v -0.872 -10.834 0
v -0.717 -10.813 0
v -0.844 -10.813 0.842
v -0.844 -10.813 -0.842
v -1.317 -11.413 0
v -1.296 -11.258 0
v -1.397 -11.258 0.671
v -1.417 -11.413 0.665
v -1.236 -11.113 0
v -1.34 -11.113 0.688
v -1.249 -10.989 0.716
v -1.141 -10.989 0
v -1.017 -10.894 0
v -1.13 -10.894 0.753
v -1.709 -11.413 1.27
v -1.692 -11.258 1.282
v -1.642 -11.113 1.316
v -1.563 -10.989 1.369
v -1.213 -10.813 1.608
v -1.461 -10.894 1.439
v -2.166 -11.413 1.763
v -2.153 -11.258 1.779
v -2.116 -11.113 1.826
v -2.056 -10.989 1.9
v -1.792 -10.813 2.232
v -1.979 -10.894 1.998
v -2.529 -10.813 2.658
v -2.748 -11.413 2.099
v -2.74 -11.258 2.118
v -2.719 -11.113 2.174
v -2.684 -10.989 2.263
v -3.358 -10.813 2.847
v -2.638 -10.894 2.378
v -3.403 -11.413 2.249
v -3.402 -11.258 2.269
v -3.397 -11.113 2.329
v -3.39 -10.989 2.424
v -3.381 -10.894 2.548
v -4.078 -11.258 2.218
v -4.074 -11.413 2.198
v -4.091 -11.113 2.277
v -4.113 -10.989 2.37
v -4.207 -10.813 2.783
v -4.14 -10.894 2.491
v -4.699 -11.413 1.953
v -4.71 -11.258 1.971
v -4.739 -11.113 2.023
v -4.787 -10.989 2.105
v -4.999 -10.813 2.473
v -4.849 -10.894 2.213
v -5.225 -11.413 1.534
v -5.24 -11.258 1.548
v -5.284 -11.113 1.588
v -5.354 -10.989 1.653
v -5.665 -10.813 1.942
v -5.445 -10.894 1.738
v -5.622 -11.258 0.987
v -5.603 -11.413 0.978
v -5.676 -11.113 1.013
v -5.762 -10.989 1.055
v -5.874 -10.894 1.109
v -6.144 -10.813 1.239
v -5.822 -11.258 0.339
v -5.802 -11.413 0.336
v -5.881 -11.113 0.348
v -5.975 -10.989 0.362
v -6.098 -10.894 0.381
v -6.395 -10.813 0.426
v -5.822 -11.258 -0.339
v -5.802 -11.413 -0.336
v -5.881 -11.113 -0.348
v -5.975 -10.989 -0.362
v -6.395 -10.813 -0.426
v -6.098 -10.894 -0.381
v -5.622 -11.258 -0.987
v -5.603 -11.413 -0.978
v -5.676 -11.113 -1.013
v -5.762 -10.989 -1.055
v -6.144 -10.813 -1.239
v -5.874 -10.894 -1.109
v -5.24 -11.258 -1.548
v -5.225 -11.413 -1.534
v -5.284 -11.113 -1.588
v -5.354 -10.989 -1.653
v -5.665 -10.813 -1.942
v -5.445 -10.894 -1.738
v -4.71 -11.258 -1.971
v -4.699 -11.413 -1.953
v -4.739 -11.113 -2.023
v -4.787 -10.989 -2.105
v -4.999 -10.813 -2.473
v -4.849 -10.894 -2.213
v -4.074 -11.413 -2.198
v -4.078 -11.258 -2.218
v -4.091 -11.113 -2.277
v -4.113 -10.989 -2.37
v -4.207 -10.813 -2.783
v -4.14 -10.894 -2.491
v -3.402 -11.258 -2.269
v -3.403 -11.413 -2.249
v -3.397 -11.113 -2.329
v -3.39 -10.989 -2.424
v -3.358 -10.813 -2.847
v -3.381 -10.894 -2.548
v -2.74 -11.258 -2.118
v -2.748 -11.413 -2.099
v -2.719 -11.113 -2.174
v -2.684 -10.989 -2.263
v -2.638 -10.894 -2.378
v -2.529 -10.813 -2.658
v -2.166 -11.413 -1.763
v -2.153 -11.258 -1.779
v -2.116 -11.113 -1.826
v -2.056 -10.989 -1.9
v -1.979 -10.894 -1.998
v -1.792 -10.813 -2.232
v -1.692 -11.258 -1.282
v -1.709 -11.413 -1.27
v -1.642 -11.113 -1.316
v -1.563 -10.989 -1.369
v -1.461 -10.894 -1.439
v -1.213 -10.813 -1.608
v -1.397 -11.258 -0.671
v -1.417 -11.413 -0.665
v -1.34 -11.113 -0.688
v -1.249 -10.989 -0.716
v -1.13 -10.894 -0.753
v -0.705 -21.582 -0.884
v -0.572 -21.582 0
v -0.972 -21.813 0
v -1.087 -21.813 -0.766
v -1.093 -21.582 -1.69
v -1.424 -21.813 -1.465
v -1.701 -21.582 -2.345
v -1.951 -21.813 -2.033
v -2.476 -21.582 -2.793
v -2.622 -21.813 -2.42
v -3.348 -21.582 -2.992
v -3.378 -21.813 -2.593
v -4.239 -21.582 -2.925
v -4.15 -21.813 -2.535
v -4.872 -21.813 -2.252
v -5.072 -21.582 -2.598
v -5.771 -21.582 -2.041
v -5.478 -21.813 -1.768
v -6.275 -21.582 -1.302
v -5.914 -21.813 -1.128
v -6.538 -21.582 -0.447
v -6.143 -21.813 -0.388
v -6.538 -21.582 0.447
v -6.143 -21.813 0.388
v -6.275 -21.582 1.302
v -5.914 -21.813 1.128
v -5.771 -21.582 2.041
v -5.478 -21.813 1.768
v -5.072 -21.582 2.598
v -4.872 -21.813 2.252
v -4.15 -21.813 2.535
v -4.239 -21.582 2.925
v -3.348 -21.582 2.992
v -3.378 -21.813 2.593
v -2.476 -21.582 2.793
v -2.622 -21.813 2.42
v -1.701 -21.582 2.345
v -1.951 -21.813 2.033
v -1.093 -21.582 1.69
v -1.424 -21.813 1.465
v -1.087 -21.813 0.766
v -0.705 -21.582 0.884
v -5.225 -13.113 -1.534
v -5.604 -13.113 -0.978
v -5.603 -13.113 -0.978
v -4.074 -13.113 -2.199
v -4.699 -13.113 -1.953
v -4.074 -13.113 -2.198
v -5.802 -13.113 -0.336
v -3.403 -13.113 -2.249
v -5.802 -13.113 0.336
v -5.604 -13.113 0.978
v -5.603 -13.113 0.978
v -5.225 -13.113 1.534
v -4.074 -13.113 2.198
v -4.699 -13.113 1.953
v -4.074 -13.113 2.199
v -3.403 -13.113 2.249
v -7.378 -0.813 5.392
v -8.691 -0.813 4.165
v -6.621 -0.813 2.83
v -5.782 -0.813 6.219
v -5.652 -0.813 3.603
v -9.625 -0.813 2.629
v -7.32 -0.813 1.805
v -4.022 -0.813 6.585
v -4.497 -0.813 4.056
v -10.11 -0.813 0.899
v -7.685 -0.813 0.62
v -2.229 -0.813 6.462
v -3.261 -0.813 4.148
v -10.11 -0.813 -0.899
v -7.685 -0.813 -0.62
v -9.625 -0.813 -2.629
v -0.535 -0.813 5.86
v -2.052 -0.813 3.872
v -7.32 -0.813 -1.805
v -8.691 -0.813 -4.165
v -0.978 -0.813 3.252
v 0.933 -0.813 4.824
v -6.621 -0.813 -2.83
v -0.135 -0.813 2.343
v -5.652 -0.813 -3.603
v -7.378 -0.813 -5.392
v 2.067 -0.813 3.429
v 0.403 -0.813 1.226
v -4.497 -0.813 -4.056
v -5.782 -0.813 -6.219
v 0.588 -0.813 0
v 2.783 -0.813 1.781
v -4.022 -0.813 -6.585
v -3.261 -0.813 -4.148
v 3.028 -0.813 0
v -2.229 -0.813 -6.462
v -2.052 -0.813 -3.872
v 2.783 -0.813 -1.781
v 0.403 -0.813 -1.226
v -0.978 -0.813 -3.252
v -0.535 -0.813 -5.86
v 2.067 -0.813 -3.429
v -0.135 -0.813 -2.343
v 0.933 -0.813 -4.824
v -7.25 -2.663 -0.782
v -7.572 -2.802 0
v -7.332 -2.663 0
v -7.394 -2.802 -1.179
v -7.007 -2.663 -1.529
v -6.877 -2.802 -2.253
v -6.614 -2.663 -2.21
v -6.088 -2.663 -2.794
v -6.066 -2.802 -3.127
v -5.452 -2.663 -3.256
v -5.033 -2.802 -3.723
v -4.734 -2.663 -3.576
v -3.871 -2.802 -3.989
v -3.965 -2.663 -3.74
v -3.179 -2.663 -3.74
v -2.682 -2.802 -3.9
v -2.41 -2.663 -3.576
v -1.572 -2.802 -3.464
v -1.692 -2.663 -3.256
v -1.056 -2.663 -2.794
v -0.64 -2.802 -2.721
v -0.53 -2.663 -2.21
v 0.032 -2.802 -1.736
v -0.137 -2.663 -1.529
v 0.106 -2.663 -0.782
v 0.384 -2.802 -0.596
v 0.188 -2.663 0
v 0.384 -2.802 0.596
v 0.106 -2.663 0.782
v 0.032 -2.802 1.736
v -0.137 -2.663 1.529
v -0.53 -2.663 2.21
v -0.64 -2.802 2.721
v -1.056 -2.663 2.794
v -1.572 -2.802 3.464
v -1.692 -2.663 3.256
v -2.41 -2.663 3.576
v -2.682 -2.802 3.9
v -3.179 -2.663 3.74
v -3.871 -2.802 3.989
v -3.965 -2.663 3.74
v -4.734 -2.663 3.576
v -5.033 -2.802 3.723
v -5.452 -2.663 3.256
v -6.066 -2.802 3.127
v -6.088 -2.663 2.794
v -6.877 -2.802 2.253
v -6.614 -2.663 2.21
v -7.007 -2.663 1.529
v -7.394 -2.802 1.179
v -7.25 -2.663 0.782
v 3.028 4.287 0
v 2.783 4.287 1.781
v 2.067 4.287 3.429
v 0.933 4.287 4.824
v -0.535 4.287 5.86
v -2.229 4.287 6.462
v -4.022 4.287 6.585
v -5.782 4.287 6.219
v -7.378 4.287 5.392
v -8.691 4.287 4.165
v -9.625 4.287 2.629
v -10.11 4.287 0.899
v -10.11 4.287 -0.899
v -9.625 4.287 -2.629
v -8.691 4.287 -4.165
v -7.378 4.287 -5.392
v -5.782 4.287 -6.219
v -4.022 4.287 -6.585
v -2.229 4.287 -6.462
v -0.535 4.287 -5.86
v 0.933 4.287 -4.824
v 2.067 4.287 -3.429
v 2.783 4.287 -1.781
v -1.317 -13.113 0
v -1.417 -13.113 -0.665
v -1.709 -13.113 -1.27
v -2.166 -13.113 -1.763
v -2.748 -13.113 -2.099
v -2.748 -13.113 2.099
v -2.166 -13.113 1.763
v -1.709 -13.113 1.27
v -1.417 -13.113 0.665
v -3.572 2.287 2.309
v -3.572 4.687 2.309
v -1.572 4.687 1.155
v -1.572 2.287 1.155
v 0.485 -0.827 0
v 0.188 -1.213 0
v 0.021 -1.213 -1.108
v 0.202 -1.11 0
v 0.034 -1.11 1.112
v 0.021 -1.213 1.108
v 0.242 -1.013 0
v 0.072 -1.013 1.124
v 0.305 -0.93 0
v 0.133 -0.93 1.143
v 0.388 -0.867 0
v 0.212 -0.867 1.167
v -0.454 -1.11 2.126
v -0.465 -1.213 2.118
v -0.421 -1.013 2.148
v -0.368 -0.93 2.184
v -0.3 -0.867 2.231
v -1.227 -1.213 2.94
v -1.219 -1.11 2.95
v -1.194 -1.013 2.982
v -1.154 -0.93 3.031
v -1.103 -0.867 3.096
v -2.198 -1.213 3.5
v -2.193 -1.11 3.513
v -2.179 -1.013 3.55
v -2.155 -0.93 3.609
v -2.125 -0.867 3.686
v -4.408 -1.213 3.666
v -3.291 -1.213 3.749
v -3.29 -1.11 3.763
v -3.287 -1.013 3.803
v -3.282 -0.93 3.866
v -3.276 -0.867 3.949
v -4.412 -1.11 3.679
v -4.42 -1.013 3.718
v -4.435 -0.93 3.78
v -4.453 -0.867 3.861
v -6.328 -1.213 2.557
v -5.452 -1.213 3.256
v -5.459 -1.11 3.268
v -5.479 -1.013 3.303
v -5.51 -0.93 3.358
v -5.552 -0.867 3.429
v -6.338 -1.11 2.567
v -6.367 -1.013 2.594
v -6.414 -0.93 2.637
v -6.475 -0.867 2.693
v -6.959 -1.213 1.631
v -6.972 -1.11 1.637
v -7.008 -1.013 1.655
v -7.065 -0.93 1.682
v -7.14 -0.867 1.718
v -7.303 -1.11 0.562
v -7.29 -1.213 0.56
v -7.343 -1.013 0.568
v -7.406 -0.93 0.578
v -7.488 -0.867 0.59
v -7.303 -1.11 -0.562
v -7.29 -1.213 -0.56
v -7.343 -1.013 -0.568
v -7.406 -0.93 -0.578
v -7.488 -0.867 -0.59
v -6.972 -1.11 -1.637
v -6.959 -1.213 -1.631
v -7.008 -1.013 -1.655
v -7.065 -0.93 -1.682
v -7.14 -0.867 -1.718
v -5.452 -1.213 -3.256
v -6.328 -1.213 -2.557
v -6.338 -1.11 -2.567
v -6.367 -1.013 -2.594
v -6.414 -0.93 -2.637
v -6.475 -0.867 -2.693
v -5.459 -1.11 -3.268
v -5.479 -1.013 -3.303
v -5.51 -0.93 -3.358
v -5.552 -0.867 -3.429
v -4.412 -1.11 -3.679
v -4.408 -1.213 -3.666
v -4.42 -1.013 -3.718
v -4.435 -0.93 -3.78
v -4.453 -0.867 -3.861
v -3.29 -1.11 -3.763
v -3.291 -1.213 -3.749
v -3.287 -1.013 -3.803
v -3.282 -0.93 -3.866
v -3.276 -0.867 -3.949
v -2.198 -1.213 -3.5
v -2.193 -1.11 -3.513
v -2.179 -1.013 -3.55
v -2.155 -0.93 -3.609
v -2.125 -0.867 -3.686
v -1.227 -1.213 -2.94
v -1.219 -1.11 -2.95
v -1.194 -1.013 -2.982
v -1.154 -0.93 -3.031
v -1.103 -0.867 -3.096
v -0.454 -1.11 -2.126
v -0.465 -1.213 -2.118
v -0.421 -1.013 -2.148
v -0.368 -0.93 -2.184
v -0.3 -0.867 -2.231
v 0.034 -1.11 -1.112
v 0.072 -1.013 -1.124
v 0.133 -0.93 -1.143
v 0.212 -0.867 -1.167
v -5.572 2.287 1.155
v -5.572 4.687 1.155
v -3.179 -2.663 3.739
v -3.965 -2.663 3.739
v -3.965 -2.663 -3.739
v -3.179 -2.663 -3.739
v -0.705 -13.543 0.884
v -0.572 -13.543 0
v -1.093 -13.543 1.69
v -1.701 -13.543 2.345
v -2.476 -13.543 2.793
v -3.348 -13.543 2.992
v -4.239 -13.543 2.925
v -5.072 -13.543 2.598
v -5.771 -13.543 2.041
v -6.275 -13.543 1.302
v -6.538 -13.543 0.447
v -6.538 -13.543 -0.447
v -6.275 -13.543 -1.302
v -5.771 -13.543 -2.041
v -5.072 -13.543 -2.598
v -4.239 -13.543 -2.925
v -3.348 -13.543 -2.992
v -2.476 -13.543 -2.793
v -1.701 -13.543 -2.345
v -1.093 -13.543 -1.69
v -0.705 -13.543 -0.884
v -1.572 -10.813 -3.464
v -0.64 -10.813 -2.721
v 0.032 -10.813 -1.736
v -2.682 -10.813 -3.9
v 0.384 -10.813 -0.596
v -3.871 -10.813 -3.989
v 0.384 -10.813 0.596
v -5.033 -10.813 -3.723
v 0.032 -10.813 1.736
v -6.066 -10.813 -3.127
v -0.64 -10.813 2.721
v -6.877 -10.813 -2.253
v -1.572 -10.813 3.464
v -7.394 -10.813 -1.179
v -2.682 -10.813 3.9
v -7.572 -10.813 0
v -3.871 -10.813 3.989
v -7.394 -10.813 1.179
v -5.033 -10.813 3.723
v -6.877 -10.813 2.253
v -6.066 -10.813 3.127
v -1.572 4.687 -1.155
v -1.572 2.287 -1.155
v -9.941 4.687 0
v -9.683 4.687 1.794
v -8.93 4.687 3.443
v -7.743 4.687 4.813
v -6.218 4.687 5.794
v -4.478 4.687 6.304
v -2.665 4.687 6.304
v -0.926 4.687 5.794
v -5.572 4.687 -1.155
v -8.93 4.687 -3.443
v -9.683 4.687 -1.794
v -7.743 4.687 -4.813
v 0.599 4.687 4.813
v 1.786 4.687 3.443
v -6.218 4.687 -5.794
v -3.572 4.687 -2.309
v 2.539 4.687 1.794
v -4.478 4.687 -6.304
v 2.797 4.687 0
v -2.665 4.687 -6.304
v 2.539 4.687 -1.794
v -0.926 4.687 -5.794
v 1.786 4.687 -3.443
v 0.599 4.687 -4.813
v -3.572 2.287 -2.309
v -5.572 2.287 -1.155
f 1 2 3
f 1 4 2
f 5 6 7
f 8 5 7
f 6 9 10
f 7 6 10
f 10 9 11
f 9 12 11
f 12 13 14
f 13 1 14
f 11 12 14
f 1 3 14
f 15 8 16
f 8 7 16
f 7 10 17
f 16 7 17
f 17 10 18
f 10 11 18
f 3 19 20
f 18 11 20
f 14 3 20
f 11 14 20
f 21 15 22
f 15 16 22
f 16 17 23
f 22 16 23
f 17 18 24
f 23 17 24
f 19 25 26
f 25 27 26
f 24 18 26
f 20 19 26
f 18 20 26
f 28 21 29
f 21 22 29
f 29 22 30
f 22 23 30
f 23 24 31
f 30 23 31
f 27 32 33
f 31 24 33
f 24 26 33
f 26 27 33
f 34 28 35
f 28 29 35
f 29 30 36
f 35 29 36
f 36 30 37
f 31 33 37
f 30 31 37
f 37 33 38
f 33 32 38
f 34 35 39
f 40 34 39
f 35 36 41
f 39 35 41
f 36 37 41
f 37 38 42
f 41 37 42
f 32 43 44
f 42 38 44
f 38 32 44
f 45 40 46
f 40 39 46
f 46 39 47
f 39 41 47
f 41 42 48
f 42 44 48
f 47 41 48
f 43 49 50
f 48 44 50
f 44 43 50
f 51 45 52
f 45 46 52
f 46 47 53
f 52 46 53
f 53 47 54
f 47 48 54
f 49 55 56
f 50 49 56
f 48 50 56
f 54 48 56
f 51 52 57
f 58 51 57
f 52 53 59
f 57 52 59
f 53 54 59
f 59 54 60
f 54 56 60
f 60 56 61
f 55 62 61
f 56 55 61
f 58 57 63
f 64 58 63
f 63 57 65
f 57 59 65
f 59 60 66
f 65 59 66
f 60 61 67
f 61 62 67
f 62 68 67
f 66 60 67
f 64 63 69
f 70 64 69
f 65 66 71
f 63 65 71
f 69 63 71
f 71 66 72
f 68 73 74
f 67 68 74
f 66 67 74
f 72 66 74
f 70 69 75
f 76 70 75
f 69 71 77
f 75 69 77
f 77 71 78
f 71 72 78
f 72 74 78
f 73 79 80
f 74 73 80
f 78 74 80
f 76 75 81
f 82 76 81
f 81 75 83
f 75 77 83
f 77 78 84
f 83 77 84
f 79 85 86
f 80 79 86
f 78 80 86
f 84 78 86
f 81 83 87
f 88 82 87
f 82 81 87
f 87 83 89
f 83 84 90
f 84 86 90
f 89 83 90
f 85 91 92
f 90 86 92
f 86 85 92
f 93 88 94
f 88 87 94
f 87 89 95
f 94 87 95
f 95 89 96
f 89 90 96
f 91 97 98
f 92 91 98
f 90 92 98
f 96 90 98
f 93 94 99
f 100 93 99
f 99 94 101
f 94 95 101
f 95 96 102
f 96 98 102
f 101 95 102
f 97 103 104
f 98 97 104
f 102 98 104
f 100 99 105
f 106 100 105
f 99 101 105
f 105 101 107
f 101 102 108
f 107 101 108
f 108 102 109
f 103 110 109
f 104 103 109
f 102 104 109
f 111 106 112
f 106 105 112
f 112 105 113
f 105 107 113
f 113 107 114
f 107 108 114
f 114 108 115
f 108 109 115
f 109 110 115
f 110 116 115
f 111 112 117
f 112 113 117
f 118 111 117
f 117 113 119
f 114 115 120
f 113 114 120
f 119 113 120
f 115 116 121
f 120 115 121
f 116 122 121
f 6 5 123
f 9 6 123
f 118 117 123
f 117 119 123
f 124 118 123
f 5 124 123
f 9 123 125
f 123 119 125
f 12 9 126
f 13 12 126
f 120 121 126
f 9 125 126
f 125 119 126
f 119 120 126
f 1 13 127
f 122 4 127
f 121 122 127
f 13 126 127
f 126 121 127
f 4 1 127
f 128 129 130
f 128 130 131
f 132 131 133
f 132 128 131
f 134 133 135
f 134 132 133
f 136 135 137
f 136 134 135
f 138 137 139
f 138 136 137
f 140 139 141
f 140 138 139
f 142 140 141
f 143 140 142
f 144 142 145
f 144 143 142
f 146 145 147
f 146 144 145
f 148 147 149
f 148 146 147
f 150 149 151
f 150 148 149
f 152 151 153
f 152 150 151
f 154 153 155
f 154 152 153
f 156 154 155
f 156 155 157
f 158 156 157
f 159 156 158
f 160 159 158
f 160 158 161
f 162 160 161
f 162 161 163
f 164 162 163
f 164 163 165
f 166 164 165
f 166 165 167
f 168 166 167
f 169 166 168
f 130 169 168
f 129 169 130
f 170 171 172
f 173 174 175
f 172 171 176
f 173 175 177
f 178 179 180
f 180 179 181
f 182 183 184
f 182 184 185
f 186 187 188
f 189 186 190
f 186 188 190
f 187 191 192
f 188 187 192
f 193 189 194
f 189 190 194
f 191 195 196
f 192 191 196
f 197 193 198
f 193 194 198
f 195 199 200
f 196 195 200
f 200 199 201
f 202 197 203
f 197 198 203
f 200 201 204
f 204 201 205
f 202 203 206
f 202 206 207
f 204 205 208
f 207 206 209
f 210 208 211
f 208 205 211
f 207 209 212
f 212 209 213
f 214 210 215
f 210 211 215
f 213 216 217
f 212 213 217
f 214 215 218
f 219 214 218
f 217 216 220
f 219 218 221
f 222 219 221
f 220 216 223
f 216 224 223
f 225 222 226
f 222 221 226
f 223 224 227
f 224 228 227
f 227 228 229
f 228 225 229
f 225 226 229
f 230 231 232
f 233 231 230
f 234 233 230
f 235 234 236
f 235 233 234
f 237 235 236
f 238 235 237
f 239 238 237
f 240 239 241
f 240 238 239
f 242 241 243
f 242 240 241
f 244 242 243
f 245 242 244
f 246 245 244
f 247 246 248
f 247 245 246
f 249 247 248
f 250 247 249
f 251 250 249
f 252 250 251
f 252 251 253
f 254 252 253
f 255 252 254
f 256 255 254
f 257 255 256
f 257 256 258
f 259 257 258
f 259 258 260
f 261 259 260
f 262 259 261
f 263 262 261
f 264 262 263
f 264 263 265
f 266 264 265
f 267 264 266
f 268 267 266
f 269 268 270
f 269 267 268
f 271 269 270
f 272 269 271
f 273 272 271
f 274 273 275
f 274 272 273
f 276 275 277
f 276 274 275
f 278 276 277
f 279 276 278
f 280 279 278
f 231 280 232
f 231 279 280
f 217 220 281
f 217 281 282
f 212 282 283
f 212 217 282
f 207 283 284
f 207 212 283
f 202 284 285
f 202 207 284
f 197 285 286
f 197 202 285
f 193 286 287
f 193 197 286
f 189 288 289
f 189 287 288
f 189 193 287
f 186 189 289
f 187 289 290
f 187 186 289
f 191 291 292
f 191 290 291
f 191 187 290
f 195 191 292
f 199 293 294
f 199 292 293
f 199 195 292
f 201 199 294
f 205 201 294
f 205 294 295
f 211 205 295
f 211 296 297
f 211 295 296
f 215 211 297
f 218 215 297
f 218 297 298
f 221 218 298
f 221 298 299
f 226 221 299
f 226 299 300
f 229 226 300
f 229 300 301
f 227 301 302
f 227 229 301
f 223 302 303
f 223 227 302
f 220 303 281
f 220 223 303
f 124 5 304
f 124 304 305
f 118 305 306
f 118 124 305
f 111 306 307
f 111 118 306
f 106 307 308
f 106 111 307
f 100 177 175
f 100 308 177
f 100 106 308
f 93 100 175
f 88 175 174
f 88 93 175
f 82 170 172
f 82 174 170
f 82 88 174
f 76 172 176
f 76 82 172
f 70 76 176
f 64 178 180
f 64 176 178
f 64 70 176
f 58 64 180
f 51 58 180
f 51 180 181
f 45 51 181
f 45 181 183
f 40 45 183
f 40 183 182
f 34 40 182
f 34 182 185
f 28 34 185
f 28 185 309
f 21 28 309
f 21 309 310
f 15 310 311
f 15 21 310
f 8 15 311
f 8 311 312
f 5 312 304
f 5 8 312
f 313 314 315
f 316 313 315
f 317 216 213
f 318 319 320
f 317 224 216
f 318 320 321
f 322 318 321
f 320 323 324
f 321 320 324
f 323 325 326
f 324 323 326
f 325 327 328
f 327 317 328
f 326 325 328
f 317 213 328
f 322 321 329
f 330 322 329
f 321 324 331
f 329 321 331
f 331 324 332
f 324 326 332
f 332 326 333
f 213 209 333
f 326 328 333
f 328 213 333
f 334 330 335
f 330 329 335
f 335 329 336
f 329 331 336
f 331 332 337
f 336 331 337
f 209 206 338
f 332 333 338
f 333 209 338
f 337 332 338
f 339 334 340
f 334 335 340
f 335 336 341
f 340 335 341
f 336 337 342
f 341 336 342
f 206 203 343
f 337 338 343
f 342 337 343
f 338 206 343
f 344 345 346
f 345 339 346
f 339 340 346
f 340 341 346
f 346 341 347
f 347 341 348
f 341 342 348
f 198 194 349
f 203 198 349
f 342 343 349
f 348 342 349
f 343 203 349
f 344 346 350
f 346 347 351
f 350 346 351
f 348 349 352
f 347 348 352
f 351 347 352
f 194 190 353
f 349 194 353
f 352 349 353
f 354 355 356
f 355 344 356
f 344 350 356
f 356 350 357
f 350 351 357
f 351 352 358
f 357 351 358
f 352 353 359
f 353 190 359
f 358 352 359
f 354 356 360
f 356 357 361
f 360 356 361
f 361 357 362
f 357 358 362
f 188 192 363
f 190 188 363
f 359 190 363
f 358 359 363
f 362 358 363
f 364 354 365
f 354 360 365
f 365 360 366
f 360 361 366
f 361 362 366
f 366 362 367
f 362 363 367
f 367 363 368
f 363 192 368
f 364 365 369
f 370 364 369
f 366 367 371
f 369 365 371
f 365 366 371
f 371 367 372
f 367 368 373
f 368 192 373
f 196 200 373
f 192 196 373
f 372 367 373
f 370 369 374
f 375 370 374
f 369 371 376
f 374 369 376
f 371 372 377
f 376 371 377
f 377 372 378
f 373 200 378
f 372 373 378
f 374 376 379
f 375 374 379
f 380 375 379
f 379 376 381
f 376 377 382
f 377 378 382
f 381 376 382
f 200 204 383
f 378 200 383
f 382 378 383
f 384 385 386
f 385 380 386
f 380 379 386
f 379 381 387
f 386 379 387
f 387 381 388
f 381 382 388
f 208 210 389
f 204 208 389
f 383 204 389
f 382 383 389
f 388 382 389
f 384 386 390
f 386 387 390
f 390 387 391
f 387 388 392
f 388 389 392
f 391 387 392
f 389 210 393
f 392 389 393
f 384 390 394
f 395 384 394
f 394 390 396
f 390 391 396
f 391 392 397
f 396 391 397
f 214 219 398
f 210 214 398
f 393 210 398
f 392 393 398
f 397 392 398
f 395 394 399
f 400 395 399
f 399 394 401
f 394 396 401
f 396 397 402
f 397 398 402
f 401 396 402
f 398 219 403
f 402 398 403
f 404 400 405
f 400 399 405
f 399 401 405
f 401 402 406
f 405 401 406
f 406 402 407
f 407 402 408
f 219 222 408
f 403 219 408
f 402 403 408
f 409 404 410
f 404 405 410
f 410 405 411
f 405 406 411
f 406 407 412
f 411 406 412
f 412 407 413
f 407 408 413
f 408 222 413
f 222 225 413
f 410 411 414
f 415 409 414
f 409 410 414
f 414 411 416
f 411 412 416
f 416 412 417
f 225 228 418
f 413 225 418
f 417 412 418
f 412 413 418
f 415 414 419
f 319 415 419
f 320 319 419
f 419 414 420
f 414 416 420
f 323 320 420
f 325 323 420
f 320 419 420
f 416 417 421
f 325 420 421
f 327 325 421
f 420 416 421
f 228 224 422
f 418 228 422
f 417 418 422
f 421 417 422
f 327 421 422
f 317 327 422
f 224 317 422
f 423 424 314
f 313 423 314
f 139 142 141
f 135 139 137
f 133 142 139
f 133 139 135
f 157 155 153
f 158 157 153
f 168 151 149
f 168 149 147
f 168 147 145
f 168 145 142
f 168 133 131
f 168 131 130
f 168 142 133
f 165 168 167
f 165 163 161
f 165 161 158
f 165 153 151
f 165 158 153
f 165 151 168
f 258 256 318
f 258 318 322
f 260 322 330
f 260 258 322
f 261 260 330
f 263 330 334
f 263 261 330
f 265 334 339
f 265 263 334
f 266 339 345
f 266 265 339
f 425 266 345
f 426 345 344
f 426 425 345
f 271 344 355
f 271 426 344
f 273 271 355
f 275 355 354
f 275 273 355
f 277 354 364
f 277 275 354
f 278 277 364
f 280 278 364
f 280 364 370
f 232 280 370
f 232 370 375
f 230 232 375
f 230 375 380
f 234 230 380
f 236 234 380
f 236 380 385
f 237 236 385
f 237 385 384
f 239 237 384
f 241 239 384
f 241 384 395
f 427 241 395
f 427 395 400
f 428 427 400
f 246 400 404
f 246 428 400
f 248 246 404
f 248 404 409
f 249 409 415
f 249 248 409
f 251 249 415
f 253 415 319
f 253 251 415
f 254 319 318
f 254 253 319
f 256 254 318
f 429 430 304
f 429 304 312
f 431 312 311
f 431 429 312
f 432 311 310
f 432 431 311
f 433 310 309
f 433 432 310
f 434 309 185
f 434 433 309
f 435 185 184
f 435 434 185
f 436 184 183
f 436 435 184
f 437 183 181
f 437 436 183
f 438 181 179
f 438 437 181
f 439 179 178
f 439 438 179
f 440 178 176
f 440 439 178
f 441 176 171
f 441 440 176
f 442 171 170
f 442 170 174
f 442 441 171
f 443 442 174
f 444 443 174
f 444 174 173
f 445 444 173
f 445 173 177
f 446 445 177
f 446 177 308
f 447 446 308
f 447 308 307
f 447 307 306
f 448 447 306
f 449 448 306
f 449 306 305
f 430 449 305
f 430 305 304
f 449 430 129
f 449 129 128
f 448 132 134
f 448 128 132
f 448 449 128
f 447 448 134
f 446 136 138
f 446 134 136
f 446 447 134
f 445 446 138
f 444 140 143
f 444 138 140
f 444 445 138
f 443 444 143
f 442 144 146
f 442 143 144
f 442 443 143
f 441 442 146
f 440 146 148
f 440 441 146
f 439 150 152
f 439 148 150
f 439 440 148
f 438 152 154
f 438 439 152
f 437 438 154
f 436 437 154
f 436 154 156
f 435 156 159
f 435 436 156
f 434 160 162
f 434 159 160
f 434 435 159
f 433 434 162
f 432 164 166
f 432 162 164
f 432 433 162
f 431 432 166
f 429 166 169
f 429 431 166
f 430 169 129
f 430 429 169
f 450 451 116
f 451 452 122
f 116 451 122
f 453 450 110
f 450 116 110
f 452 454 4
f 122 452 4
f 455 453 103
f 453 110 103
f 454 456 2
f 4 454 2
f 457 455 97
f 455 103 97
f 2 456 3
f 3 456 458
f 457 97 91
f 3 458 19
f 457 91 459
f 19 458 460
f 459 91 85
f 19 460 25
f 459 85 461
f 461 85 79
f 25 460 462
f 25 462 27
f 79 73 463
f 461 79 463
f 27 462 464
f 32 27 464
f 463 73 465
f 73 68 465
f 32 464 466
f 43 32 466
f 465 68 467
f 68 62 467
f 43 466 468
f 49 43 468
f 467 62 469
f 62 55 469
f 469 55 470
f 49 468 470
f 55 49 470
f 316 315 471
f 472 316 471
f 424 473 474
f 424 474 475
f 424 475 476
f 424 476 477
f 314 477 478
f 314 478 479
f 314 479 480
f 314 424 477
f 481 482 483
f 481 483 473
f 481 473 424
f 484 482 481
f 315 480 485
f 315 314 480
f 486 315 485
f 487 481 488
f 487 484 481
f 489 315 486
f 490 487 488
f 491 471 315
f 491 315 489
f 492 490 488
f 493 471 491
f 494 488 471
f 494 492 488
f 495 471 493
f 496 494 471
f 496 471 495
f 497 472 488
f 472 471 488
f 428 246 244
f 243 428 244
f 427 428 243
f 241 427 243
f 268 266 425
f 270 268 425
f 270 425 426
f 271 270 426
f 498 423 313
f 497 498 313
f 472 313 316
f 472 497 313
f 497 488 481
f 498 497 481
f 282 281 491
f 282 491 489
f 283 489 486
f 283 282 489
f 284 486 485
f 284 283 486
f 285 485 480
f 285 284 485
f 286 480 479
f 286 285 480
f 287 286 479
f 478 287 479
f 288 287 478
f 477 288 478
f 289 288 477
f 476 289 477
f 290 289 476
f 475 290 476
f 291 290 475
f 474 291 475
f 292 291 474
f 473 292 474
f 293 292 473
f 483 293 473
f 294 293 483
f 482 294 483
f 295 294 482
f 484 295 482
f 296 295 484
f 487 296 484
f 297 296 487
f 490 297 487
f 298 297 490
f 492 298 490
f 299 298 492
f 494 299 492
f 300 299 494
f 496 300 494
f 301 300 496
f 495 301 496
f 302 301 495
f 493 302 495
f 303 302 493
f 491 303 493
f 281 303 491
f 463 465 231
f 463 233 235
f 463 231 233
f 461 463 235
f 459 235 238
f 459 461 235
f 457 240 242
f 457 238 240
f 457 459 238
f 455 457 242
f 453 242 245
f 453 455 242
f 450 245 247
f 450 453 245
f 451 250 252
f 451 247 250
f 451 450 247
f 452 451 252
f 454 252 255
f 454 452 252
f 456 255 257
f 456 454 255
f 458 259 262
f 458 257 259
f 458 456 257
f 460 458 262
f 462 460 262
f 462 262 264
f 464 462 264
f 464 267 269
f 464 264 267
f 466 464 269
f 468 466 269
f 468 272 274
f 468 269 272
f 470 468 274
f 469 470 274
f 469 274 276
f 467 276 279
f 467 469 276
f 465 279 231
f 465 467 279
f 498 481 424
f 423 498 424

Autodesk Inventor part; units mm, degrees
ref_plane "YZ Plane" through (0, 0, 0) normal (1, 0, 0) x (0, 1, 0)
ref_plane "XZ Plane" through (0, 0, 0) normal (0, 1, 0) x (-1, 0, 0)
ref_plane "XY Plane" through (0, 0, 0) normal (0, 0, 1) x (1, 0, 0)
sketch "Sketch1" plane through (0, 0, 0) normal (0, 0, 1) x (1, 0, 0)
  line L0 (-3.5718, -2.6632) -> (-7.5718, -2.6632)
  line L1 (-7.5718, -2.6632) -> (-7.5718, -10.8132)
  line L2 (-7.5718, -10.8132) -> (-3.5718, -10.8132)
  line L3 (-3.5718, -10.8132) -> (-3.5718, -2.6632)
  dimension "d1" = 8.15
  dimension "d2" = 4
revolve "Shoulder" add sketch "Sketch1" angle 360 about axis through (-3.5718, -10.8132, 0) along (0, 1, 0)
sketch "Sketch2" plane through (-3.5718, -2.6632, 0) normal (0, 1, 0) x (1, 0, 0)
  circle A0 centre (0, 0) radius 4 projected
  circle A1 centre (0, 0) radius 3.76
  dimension "d3" = 7.52
extrude "Shoulder_neck" add sketch "Sketch2" along normal blind 1.85 contours A1
sketch "Sketch3" plane through (-3.5718, -0.8132, 0) normal (0, 1, 0) x (1, 0, 0)
  circle A0 centre (0, 0) radius 3.76 projected
  circle A1 centre (0, 0) radius 6.6
  dimension "d6" = 13.2
extrude "Head" add sketch "Sketch3" along normal blind 5.5 contours A0 | A1
sketch "Sketch4" plane through (-3.5718, -10.8132, 0) normal (0, -1, 0) x (1, 0, 0)
  circle A0 centre (0, 0) radius 4 projected
  circle A1 centre (0, 0) radius 2.255
  dimension "d9" = 4.51
extrude "Thread_neck" add sketch "Sketch4" along normal blind 2.3 contours A1
sketch "Sketch5" plane through (-3.5718, -13.1132, 0) normal (0, -1, 0) x (1, 0, 0)
  circle A0 centre (0, 0) radius 2.255 projected
  circle A1 centre (0, 0) radius 3
  dimension "d12" = 6
extrude "Thread_shoulder" add sketch "Sketch5" along normal blind 8.7 contours A0 | A1
sketch "Sketch6" plane through (-3.5718, 4.6868, 0) normal (0, 1, 0) x (1, 0, 0)
  circle A0 centre (0, 0) radius 6.6 projected
  circle A1 centre (0, 0) radius 2 construction
  line L0 (-2, 1.1547) -> (-2, -1.1547)
  line L1 (-2, -1.1547) -> (0, -2.3094)
  line L2 (0, -2.3094) -> (2, -1.1547)
  line L3 (2, -1.1547) -> (2, 1.1547)
  line L4 (2, 1.1547) -> (0, 2.3094)
  line L5 (0, 2.3094) -> (-2, 1.1547)
  dimension "d15" = 4
extrude "Hex" cut sketch "Sketch6" against normal blind 2.4 contours L5 L4 L3 L2 L1 L0
chamfer "Chamfer1" distance 0.24 angle 30 1 edges at (0.4282, -2.6632, 0) measured on face at (-7.4166, -2.6632, -0.619)
fillet "Fillet1" radius 0.4 1 edges at (-7.3318, -0.8132, 0)
chamfer "Chamfer2" distance 0.4 angle 30 1 edges at (-10.1718, 4.6868, 0) measured on face at (2.9427, 2.8535, 1.0587)
chamfer "Chamfer3" distance 0.4 angle 30 1 edges at (-6.5718, -21.8132, 0) measured on face at (-2.6428, -21.8132, 0.823)
fillet "Fillet2" radius 0.6 1 edges at (-5.8268, -10.8132, 0)
chamfer "Chamfer7" distance 0.745 angle 30 1 edges at (-6.5718, -13.1132, 0) measured on face at (-0.871, -13.1132, -0.4192)
thread "Thread" size "M6x1" class "6g" standard "ANSI Metric M Profile" full length
equation "\"d3\" = Shoulder_neck_dia"
equation "\"d4\" = Shoulder_neck_length"
equation "\"d6\" = Head_diameter"
equation "\"d7\" = Head_height"
equation "\"d9\" = Thread_neck_dia"
equation "\"d10\" = Thread_neck_length"
equation "\"d12\" = Thread_diameter"
equation "\"d13\" = Thread_length - Thread_neck_length"
equation "\"d15\" = Hex_size"
equation "\"d16\" = Hex_length"
equation "\"d18\" = -0.5 * Shoulder_neck_dia + 0.5 * Shoulder_diameter"
equation "\"d64\" = -0.5 * Shoulder_neck_dia + 0.5 * Shoulder_diameter"
equation "\"d21\" = 0.1 * Hex_size"
equation "\"d65\" = 0.1 * Hex_size"
equation "\"d23\" = 0.5 * Thread_pitch"
equation "\"d66\" = 0.5 * Thread_pitch"
equation "\"d25\" = Thread_neck_radius"
equation "\"d60\" = -0.5 * Thread_neck_dia + 0.5 * Thread_diameter"
equation "\"d67\" = -0.5 * Thread_neck_dia + 0.5 * Thread_diameter"
equation "\"d1\" = Shoulder_length - Shoulder_neck_length"
equation "\"d2\" = 0.5 * Shoulder_diameter"
equation "\"Shoulder_diameter\" = 8"
equation "\"Shoulder_length\" = 10"
equation "\"Shoulder_neck_dia\" = 7.52"
equation "\"Thread_diameter\" = 6"
equation "\"Thread_length\" = 11"
equation "\"Head_diameter\" = 13.2"
equation "\"Head_height\" = 5.5"
equation "\"Thread_neck_dia\" = 4.51"
equation "\"Hex_size\" = 4"
equation "\"Hex_length\" = 2.4"
equation "\"Thread_pitch\" = 0.8"
equation "\"Shoulder_neck_length\" = 1.85"
equation "\"Thread_neck_length\" = 2.3"
equation "\"Thread_neck_radius\" = 0.6"
properties part number "SCREW, SHOULDER, P, 12.9, 8MMX10MM" material "Steel, High Strength Low Alloy"
